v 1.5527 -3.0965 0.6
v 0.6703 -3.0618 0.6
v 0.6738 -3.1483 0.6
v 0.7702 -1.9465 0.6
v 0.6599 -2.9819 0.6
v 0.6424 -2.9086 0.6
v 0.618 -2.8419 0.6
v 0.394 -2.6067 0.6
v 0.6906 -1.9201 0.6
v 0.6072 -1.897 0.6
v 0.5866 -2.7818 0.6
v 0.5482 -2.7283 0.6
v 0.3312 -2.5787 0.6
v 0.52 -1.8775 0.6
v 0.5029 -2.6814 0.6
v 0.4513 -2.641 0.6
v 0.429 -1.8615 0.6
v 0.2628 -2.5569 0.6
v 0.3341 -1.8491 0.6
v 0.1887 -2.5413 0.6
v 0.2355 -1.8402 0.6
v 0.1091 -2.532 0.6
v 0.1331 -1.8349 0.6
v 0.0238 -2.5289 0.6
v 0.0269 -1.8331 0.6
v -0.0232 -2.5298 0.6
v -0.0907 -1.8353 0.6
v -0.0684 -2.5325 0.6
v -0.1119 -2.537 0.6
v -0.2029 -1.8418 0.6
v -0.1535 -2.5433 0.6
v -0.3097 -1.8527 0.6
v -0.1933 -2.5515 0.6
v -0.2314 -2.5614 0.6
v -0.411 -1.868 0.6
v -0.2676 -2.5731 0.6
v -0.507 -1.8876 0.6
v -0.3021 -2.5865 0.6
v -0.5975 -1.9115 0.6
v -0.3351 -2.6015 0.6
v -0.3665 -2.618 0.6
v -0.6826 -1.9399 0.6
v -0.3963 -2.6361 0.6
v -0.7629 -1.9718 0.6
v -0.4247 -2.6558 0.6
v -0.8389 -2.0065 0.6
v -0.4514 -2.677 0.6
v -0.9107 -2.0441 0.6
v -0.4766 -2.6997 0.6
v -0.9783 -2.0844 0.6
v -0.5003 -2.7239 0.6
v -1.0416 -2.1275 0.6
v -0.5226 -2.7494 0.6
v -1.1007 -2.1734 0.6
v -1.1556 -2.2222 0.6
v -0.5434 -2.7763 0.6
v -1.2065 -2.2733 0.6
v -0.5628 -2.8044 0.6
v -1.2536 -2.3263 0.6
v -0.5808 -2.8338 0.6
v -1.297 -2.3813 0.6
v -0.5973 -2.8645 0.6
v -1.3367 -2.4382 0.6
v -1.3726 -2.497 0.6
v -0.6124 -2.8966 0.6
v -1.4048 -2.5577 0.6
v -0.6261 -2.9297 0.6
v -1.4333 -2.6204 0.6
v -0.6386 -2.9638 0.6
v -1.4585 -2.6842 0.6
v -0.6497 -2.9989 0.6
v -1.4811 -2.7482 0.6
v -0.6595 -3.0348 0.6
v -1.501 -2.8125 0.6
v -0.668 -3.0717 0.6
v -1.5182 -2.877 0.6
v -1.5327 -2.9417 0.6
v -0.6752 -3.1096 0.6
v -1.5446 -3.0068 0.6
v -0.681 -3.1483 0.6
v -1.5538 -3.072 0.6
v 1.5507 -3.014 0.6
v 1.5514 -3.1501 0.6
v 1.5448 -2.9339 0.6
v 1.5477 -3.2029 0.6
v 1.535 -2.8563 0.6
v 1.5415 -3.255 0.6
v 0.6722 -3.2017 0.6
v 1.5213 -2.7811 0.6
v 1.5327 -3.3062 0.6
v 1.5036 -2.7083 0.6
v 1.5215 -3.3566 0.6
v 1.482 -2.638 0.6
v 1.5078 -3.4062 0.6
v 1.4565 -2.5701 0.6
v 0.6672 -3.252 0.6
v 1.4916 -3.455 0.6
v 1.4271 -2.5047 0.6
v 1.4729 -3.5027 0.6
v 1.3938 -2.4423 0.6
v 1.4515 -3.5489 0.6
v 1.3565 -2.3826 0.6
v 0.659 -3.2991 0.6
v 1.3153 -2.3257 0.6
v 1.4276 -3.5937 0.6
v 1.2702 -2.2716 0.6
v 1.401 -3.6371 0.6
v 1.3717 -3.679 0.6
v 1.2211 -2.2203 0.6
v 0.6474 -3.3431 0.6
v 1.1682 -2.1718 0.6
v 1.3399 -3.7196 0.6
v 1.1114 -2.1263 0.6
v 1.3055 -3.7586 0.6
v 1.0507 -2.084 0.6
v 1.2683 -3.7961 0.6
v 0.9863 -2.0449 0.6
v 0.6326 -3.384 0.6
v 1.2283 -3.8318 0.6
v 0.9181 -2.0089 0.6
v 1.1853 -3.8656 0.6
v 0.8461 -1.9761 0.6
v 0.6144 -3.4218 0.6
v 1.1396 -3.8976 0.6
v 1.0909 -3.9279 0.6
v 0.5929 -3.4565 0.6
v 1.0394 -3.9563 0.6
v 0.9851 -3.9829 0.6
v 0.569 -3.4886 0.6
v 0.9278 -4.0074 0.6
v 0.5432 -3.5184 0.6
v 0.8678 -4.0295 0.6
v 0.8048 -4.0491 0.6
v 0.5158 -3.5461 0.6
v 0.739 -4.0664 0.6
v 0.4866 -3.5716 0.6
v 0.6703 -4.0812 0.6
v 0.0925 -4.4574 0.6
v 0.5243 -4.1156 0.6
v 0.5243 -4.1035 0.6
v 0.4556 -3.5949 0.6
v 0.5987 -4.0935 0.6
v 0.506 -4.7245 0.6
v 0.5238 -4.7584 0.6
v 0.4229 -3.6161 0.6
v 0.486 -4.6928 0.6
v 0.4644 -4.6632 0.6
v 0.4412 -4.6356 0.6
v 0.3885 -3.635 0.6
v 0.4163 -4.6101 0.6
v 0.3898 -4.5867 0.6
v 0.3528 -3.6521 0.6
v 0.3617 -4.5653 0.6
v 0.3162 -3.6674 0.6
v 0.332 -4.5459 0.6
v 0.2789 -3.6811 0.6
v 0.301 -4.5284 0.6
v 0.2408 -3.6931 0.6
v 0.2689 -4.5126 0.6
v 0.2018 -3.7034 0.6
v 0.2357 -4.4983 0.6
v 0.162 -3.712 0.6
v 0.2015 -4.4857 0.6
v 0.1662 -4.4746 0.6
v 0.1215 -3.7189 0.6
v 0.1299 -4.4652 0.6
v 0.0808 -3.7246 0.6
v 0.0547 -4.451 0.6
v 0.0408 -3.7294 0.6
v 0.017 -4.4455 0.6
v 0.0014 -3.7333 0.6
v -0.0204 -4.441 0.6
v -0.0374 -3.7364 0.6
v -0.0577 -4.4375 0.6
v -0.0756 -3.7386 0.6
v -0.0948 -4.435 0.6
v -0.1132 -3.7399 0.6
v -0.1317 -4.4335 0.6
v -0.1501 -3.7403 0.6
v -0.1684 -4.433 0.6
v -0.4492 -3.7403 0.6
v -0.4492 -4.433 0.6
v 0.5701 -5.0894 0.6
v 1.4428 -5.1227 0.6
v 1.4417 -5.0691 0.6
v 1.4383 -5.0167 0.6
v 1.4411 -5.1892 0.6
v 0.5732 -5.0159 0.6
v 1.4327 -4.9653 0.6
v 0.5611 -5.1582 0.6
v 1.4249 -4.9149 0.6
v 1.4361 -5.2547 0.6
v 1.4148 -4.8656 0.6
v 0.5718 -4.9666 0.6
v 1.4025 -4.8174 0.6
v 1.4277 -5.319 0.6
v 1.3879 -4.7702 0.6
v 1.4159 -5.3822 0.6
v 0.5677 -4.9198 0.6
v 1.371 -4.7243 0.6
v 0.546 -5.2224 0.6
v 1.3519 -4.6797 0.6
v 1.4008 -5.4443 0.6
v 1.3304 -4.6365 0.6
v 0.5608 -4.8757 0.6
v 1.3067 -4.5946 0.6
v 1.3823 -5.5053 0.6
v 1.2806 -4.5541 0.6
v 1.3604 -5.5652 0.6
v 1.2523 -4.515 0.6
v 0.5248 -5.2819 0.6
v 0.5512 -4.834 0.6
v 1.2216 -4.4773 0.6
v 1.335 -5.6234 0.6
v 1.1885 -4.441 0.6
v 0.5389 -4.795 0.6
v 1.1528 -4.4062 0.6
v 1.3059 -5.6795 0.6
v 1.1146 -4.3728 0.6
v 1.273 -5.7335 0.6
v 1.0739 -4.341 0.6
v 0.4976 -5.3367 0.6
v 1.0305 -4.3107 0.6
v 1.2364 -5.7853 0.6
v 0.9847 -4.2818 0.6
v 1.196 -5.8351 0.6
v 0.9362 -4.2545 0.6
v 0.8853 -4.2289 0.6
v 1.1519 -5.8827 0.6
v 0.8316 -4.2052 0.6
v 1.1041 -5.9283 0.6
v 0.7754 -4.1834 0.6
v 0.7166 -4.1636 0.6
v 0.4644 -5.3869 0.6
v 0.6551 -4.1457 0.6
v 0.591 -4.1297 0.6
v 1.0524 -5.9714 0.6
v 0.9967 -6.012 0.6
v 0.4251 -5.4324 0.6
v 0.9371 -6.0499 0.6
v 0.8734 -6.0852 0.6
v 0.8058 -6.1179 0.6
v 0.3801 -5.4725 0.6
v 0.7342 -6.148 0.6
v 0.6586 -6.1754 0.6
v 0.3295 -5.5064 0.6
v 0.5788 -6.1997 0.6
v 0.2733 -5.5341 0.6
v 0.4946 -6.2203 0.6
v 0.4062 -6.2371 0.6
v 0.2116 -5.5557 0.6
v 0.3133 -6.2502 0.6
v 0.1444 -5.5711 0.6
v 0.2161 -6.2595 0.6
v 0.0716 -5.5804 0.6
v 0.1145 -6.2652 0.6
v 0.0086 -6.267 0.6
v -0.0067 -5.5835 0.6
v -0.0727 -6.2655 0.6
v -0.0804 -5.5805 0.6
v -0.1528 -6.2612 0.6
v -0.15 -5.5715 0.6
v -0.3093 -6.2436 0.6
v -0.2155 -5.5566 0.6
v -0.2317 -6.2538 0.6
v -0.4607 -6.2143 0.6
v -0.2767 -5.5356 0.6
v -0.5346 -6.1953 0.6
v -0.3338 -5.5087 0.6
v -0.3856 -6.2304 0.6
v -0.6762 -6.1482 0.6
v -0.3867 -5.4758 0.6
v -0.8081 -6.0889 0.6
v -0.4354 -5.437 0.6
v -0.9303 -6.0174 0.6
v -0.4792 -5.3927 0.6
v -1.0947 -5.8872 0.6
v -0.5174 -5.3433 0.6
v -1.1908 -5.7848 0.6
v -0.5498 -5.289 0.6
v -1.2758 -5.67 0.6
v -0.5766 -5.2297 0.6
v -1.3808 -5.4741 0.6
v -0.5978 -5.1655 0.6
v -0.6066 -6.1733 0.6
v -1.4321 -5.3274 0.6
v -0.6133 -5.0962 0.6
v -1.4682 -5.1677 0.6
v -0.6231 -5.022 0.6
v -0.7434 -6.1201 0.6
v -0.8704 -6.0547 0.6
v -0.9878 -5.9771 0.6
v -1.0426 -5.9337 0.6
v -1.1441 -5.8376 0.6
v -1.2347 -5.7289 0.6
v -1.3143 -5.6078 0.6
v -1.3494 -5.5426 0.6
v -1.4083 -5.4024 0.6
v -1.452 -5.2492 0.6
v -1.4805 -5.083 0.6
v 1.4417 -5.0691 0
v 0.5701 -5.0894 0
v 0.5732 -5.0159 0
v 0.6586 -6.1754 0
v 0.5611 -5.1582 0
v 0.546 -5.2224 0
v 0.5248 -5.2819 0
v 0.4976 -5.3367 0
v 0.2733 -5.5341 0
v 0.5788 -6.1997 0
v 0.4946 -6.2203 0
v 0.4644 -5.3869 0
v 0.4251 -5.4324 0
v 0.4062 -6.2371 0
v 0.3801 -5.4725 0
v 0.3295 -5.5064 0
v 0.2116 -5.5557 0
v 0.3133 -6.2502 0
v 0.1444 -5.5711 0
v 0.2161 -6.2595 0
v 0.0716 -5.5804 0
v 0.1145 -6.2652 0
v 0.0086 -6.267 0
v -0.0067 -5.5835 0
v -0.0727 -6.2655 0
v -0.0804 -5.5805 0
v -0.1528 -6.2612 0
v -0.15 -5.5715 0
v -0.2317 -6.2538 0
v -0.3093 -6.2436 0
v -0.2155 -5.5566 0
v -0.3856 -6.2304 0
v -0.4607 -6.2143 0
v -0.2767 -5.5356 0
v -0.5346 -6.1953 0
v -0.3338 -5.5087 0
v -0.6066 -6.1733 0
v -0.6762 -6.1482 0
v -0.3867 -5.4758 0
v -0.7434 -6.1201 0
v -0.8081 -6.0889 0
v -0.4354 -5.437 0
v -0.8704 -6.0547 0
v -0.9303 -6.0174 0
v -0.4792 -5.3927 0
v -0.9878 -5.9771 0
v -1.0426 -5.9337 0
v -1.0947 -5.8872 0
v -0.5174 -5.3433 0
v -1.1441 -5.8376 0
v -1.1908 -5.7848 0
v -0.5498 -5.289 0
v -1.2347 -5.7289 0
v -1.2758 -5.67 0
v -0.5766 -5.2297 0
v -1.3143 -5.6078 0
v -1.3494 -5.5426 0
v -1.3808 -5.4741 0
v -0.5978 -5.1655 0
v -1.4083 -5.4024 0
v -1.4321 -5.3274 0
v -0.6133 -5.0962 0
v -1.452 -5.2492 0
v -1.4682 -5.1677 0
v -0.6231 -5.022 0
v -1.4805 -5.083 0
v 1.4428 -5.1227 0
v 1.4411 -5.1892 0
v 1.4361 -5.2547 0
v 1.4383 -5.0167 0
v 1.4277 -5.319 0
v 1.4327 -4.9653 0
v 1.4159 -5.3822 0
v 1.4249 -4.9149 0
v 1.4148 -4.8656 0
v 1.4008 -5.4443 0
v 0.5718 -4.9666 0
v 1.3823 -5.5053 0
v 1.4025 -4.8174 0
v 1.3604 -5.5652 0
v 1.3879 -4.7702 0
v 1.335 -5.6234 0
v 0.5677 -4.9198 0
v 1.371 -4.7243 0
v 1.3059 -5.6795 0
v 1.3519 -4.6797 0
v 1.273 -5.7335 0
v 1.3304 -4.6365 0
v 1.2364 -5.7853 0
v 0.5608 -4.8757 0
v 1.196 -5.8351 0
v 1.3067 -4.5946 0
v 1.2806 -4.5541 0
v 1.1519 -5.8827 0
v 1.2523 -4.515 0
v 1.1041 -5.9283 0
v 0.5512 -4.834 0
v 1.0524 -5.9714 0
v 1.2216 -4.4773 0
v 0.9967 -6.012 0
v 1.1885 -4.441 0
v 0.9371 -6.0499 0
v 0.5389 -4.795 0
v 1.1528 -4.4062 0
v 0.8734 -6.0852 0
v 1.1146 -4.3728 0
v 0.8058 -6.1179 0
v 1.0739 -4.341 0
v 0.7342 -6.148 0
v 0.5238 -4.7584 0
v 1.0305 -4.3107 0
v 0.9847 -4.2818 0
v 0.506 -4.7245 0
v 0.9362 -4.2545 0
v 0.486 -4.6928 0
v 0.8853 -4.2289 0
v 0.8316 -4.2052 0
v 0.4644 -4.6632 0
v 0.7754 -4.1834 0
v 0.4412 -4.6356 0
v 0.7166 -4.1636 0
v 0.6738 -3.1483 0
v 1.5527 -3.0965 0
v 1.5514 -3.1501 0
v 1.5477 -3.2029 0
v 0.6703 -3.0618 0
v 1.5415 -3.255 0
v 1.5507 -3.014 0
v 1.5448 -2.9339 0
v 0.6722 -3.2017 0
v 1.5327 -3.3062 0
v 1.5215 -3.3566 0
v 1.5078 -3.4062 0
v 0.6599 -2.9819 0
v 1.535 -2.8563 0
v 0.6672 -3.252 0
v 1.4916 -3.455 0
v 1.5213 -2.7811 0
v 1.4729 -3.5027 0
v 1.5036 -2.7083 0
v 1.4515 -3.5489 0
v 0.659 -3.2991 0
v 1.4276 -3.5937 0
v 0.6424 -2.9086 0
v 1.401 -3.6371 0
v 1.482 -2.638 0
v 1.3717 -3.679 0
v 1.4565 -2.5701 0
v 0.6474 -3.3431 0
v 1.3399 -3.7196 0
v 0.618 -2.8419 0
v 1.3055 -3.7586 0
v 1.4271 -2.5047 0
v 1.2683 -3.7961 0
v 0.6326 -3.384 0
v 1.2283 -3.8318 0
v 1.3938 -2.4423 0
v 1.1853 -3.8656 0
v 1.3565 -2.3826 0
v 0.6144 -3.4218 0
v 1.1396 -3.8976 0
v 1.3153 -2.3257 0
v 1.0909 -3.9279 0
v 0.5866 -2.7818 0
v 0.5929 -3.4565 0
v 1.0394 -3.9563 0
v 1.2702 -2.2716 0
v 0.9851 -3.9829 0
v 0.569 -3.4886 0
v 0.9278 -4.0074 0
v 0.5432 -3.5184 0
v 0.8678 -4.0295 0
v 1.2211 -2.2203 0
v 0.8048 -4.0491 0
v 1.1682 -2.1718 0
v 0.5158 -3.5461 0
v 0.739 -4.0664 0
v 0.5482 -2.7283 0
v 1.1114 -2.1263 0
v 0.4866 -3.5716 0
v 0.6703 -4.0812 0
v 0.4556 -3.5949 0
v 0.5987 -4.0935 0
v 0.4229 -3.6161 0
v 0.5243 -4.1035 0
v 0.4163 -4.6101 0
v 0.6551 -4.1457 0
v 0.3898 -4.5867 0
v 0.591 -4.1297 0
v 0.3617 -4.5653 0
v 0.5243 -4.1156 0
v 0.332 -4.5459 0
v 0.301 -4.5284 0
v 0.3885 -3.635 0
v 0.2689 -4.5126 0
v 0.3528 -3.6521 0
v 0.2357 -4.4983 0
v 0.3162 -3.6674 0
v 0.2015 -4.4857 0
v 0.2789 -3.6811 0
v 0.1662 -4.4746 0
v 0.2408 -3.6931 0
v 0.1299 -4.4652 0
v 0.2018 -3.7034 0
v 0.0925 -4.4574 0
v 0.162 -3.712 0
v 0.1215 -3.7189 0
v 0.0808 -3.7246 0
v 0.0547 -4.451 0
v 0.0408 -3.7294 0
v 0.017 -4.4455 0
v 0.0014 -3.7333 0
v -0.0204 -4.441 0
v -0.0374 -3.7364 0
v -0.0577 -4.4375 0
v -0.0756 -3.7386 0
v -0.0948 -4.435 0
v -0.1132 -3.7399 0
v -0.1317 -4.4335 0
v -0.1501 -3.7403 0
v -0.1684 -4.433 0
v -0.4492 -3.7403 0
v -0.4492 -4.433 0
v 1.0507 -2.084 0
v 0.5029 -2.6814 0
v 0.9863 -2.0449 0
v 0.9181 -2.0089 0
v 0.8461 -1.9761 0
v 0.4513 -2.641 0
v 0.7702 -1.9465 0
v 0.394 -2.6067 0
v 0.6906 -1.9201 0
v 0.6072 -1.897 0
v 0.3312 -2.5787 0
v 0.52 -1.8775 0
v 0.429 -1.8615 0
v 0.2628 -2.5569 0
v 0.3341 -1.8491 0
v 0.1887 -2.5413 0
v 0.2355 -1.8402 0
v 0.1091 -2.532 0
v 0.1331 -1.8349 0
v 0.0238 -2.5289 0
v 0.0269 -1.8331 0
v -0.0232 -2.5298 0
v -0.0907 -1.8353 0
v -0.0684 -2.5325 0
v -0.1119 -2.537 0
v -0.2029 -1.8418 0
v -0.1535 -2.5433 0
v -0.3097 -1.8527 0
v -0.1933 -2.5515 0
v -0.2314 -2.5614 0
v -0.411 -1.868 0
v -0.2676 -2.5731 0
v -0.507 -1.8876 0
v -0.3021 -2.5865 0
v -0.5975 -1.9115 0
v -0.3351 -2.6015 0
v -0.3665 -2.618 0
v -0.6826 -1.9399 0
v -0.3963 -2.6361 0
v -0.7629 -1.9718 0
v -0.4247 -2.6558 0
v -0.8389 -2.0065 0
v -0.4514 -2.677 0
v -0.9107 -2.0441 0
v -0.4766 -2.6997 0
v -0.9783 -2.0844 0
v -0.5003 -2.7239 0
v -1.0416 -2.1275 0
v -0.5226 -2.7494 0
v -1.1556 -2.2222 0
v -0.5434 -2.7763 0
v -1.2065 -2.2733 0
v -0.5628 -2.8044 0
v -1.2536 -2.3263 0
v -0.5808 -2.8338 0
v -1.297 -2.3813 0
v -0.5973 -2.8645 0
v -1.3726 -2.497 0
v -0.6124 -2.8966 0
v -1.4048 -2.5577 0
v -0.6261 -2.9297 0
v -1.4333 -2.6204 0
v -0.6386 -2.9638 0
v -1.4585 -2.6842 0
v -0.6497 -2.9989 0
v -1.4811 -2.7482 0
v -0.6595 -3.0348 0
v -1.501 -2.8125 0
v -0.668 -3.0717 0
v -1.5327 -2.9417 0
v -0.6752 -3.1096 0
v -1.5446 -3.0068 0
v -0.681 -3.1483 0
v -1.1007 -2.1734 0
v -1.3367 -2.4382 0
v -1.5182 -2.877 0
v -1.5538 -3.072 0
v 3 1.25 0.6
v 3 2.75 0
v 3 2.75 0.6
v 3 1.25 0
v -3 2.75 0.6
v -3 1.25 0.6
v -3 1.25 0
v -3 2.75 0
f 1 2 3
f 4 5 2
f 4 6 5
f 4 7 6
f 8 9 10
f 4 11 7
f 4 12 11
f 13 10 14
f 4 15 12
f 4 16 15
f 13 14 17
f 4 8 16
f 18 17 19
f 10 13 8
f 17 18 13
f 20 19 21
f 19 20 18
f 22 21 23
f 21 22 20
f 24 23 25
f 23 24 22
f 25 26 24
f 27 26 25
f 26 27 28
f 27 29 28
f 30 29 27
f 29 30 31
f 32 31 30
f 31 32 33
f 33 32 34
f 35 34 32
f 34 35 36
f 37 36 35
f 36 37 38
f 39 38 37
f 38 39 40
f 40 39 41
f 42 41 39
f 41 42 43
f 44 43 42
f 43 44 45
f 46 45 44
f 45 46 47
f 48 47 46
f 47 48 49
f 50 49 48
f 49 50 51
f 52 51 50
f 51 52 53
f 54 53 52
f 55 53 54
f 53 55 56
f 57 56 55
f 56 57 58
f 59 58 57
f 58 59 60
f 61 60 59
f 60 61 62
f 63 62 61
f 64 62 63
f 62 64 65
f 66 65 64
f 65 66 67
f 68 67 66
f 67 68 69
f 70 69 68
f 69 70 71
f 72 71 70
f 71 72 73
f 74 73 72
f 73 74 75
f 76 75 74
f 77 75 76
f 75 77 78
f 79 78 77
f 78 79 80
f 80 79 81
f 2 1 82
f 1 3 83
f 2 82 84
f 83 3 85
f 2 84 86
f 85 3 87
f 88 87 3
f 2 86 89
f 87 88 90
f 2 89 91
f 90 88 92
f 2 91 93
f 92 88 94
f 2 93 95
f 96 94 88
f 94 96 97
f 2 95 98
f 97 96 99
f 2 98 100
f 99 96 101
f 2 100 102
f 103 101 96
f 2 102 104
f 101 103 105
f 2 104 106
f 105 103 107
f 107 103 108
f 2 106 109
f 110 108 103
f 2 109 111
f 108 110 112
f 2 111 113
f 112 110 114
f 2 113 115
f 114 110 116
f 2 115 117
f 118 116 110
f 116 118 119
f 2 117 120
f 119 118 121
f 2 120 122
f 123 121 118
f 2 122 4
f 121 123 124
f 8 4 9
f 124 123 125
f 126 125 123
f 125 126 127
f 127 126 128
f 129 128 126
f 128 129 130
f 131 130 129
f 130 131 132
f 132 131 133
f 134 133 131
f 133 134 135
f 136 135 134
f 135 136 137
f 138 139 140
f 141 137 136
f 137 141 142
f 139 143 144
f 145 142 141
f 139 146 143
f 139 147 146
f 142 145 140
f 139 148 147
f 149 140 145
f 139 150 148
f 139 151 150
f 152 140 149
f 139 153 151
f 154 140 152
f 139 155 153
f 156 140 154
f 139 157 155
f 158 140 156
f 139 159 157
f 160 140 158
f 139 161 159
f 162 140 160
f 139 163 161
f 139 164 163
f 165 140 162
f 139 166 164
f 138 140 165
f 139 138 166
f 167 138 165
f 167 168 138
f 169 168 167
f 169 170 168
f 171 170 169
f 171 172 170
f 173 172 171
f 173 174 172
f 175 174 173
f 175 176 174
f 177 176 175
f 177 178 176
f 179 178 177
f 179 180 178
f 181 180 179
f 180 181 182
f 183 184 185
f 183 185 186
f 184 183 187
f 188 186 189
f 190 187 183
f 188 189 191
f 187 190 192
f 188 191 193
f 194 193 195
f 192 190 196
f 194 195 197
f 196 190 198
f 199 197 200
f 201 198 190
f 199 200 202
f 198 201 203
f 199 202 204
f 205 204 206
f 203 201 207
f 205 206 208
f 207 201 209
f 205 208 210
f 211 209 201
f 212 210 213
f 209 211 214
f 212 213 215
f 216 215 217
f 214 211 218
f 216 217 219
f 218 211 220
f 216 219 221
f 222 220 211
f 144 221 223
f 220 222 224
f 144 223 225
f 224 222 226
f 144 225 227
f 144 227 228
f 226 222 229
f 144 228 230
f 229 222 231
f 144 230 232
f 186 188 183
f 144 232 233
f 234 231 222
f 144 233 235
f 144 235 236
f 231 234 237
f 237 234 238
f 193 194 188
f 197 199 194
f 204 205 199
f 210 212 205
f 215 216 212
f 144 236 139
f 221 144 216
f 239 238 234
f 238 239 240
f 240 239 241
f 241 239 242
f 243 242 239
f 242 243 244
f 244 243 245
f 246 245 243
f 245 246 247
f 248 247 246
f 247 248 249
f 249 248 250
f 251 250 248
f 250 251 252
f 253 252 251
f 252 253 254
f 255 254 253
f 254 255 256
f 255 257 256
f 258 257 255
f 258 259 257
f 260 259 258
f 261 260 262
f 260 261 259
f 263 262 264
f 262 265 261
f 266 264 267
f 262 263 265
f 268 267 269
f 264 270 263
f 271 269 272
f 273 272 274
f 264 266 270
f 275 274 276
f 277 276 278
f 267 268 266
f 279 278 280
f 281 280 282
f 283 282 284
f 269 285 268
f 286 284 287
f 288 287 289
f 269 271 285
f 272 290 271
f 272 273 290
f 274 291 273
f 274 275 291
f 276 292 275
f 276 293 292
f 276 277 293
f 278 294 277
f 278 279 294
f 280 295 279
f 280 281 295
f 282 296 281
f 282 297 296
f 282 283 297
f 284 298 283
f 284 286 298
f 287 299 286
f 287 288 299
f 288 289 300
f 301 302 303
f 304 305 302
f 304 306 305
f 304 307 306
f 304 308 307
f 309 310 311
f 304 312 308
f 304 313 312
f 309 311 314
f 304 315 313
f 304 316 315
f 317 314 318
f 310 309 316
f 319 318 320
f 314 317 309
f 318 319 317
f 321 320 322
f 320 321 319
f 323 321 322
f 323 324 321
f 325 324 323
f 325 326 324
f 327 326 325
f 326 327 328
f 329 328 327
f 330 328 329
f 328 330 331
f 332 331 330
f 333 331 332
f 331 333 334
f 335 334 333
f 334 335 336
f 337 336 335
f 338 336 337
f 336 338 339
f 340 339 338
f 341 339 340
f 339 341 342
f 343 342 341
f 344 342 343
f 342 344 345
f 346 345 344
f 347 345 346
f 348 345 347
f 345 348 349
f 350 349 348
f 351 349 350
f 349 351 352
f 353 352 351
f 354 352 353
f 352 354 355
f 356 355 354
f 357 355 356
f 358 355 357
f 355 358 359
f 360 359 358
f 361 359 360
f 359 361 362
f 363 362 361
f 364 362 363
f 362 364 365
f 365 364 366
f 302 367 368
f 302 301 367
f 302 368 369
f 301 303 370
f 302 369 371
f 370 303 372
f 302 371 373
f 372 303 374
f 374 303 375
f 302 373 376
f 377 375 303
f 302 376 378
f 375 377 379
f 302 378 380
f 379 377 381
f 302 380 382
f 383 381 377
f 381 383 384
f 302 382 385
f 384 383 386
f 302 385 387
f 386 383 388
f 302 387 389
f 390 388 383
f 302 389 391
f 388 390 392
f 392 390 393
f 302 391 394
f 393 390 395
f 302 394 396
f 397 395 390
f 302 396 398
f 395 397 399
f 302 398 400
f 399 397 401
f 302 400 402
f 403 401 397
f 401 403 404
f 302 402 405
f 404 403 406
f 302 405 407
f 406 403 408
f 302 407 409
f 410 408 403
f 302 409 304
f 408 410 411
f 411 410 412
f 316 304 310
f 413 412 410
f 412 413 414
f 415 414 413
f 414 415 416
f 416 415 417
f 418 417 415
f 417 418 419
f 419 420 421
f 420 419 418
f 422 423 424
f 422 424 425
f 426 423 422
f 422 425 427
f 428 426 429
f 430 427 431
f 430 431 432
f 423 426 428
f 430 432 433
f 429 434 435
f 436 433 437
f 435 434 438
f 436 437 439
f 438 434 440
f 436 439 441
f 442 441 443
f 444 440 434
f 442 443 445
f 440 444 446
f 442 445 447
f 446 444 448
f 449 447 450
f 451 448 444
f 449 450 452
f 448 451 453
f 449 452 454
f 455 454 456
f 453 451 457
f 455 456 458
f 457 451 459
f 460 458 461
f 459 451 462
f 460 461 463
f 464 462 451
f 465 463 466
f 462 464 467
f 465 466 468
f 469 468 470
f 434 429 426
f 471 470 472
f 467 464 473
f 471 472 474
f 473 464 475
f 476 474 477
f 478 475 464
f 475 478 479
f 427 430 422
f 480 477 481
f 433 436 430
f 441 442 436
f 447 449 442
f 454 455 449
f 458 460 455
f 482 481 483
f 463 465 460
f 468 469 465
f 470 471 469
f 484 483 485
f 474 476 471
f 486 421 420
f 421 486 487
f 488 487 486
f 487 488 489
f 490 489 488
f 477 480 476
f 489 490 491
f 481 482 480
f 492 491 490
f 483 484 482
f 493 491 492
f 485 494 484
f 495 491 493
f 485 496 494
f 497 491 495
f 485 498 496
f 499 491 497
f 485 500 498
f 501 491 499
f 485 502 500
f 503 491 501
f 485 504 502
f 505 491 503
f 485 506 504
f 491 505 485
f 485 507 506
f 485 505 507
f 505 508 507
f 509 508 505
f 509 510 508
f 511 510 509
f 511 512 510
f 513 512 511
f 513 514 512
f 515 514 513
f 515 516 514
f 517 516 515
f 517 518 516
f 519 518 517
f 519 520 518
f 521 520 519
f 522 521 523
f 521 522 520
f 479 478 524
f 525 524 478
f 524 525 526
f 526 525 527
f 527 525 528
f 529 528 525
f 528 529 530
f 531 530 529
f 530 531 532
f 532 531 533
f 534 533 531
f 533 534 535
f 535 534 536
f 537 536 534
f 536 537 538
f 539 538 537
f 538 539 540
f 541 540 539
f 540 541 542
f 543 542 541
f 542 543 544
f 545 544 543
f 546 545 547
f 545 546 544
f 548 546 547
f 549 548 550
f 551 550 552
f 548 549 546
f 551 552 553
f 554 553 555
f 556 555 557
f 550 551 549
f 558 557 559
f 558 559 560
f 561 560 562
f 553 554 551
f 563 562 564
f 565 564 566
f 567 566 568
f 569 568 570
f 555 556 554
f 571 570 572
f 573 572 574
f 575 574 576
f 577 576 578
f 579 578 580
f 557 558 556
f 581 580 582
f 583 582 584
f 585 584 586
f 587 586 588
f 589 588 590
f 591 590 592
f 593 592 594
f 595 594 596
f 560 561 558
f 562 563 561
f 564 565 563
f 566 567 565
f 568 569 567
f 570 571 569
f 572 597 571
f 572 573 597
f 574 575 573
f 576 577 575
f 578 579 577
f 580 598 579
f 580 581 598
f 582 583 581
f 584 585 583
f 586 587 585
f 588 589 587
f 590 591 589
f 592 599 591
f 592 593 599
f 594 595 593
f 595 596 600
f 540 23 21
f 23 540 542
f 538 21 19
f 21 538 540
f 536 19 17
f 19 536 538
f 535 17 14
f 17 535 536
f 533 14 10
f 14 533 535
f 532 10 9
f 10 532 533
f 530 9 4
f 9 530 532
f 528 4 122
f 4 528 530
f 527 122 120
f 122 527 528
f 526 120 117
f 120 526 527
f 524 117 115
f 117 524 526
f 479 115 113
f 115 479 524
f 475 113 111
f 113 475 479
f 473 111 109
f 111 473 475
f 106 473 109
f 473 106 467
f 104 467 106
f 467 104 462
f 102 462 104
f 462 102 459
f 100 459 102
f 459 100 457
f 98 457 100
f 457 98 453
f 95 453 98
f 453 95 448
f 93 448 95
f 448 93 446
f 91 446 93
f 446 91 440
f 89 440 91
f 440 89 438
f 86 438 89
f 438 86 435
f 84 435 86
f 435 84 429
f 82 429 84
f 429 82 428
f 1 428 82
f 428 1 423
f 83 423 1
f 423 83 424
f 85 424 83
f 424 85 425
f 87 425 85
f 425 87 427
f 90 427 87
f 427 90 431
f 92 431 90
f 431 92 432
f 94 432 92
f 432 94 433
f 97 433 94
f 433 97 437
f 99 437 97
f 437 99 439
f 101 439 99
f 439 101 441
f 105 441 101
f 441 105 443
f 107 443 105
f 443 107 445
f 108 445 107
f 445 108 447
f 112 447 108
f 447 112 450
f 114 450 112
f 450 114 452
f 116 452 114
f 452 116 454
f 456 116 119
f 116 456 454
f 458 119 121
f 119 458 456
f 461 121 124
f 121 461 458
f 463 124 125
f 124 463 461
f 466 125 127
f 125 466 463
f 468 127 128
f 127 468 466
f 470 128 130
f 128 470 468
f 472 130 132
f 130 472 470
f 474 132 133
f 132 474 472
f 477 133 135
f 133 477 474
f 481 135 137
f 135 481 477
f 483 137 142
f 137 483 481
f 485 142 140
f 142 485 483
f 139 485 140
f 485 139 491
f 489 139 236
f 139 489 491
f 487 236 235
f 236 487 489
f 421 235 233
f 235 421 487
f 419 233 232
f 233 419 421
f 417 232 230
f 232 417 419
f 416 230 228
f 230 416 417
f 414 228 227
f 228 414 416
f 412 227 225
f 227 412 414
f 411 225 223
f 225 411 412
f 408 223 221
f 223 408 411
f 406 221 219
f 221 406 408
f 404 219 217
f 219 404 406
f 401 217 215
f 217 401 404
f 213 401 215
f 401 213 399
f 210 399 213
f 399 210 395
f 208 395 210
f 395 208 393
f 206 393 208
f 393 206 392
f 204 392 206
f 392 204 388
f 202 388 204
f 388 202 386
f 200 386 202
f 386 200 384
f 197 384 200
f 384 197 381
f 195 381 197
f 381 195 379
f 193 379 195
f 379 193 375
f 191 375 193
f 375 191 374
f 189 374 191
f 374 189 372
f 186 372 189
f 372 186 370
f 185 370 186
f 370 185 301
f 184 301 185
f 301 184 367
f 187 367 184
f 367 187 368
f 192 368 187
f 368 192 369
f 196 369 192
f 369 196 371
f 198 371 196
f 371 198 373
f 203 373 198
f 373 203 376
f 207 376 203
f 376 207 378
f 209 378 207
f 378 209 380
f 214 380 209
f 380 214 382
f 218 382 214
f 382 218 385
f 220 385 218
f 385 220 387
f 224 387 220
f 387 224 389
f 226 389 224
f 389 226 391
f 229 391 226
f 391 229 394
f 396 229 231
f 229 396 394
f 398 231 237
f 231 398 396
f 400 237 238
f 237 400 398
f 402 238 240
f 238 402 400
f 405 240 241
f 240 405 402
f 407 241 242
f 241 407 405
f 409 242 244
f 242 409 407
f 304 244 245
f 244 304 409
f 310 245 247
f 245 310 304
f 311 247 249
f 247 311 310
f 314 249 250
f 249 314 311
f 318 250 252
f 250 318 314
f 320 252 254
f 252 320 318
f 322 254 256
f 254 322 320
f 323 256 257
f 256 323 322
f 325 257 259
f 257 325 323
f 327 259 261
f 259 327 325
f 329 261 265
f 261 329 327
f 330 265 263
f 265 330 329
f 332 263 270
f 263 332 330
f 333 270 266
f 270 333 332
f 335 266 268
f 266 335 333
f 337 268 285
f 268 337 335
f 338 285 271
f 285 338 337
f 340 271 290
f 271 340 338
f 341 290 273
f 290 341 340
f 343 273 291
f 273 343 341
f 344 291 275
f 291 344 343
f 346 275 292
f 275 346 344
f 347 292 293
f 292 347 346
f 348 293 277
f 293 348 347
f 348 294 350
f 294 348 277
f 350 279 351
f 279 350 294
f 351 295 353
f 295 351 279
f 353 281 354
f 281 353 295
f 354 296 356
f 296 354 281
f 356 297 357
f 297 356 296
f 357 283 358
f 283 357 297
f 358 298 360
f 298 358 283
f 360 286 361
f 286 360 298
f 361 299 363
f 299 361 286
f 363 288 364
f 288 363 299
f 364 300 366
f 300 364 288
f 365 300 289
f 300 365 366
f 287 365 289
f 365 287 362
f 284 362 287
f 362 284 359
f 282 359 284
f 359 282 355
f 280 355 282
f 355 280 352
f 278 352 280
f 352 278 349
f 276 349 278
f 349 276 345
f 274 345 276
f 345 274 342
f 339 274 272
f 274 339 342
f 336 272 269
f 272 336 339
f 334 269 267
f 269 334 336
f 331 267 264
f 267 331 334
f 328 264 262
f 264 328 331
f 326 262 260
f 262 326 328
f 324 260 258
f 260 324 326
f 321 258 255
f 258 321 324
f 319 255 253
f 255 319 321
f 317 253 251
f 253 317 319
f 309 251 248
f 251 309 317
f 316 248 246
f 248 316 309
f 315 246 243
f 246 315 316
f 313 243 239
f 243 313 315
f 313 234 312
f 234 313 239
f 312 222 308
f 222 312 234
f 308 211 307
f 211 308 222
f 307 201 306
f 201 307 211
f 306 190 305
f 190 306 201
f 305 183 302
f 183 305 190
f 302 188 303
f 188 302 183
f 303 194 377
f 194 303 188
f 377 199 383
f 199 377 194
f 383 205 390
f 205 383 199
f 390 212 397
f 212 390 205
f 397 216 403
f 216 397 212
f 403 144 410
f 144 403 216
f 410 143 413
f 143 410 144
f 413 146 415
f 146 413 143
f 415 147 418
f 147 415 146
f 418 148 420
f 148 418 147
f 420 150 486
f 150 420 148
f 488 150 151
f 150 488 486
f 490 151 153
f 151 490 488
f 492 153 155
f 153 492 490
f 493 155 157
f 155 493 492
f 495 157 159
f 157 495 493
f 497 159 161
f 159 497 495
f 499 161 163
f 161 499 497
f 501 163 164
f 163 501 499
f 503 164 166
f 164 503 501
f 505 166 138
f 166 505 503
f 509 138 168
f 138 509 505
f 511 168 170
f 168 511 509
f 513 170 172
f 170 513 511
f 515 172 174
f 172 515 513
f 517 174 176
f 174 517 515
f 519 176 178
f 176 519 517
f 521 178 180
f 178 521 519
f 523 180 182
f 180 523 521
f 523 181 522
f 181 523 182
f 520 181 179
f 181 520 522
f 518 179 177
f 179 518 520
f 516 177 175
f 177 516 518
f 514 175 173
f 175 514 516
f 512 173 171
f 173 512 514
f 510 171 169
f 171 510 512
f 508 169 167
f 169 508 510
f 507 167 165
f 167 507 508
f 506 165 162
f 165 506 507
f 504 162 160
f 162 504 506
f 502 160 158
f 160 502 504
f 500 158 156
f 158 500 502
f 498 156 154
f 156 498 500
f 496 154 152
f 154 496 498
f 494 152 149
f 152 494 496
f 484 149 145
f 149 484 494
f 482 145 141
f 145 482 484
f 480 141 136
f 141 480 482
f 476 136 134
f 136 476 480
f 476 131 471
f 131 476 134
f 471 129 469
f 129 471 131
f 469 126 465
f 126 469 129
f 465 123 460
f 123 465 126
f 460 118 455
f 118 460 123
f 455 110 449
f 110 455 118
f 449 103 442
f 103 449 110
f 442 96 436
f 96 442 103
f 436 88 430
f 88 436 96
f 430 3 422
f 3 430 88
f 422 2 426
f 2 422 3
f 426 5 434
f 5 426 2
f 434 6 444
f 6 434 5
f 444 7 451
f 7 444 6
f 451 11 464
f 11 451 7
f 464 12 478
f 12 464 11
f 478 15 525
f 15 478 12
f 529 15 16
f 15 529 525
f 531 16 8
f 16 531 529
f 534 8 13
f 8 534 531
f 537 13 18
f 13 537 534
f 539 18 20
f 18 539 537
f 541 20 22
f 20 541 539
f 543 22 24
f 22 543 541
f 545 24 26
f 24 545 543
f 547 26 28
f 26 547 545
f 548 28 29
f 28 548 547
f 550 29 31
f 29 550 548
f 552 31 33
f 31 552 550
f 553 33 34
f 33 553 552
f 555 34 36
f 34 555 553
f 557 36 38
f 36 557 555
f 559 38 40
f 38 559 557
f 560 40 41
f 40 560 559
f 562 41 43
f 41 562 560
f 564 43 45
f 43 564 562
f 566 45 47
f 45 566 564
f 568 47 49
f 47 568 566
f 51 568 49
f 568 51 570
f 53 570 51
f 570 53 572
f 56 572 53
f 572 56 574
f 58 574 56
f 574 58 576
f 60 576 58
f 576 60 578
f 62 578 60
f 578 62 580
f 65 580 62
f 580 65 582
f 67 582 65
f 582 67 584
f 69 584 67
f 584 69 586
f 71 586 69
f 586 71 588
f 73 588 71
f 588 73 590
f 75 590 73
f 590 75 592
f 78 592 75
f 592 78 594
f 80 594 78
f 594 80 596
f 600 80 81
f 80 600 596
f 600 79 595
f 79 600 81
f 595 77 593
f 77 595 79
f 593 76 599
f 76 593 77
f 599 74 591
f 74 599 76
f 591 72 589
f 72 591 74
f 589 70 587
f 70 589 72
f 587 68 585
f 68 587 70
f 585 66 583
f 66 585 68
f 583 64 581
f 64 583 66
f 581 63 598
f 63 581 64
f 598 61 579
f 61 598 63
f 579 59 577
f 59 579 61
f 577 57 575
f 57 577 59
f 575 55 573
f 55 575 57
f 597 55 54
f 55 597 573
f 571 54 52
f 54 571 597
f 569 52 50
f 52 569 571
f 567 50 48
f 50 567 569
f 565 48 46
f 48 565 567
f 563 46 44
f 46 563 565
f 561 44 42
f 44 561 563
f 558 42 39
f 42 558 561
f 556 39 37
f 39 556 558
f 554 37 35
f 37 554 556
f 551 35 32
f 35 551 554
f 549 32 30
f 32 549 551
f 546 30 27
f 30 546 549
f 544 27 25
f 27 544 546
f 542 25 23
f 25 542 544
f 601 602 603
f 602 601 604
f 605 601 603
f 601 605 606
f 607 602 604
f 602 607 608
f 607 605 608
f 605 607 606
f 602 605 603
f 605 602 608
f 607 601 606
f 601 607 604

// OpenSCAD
$fn = 50;

difference() {
	union() {
		translate(v = [0.0, -4.0, 0.6]) {
			rotate(a = [180, 0, 0]) {
				linear_extrude(height = 0.6) {
					text(font = "Liberation Sans:style=Bold", halign = "center", size = 4.5, text = "3", valign = "center");
				}
			}
		}
		translate(v = [-3.0, 1.25, 0]) {
			cube(size = [6, 1.5, 0.6]);
		}
	}
	union();
}
